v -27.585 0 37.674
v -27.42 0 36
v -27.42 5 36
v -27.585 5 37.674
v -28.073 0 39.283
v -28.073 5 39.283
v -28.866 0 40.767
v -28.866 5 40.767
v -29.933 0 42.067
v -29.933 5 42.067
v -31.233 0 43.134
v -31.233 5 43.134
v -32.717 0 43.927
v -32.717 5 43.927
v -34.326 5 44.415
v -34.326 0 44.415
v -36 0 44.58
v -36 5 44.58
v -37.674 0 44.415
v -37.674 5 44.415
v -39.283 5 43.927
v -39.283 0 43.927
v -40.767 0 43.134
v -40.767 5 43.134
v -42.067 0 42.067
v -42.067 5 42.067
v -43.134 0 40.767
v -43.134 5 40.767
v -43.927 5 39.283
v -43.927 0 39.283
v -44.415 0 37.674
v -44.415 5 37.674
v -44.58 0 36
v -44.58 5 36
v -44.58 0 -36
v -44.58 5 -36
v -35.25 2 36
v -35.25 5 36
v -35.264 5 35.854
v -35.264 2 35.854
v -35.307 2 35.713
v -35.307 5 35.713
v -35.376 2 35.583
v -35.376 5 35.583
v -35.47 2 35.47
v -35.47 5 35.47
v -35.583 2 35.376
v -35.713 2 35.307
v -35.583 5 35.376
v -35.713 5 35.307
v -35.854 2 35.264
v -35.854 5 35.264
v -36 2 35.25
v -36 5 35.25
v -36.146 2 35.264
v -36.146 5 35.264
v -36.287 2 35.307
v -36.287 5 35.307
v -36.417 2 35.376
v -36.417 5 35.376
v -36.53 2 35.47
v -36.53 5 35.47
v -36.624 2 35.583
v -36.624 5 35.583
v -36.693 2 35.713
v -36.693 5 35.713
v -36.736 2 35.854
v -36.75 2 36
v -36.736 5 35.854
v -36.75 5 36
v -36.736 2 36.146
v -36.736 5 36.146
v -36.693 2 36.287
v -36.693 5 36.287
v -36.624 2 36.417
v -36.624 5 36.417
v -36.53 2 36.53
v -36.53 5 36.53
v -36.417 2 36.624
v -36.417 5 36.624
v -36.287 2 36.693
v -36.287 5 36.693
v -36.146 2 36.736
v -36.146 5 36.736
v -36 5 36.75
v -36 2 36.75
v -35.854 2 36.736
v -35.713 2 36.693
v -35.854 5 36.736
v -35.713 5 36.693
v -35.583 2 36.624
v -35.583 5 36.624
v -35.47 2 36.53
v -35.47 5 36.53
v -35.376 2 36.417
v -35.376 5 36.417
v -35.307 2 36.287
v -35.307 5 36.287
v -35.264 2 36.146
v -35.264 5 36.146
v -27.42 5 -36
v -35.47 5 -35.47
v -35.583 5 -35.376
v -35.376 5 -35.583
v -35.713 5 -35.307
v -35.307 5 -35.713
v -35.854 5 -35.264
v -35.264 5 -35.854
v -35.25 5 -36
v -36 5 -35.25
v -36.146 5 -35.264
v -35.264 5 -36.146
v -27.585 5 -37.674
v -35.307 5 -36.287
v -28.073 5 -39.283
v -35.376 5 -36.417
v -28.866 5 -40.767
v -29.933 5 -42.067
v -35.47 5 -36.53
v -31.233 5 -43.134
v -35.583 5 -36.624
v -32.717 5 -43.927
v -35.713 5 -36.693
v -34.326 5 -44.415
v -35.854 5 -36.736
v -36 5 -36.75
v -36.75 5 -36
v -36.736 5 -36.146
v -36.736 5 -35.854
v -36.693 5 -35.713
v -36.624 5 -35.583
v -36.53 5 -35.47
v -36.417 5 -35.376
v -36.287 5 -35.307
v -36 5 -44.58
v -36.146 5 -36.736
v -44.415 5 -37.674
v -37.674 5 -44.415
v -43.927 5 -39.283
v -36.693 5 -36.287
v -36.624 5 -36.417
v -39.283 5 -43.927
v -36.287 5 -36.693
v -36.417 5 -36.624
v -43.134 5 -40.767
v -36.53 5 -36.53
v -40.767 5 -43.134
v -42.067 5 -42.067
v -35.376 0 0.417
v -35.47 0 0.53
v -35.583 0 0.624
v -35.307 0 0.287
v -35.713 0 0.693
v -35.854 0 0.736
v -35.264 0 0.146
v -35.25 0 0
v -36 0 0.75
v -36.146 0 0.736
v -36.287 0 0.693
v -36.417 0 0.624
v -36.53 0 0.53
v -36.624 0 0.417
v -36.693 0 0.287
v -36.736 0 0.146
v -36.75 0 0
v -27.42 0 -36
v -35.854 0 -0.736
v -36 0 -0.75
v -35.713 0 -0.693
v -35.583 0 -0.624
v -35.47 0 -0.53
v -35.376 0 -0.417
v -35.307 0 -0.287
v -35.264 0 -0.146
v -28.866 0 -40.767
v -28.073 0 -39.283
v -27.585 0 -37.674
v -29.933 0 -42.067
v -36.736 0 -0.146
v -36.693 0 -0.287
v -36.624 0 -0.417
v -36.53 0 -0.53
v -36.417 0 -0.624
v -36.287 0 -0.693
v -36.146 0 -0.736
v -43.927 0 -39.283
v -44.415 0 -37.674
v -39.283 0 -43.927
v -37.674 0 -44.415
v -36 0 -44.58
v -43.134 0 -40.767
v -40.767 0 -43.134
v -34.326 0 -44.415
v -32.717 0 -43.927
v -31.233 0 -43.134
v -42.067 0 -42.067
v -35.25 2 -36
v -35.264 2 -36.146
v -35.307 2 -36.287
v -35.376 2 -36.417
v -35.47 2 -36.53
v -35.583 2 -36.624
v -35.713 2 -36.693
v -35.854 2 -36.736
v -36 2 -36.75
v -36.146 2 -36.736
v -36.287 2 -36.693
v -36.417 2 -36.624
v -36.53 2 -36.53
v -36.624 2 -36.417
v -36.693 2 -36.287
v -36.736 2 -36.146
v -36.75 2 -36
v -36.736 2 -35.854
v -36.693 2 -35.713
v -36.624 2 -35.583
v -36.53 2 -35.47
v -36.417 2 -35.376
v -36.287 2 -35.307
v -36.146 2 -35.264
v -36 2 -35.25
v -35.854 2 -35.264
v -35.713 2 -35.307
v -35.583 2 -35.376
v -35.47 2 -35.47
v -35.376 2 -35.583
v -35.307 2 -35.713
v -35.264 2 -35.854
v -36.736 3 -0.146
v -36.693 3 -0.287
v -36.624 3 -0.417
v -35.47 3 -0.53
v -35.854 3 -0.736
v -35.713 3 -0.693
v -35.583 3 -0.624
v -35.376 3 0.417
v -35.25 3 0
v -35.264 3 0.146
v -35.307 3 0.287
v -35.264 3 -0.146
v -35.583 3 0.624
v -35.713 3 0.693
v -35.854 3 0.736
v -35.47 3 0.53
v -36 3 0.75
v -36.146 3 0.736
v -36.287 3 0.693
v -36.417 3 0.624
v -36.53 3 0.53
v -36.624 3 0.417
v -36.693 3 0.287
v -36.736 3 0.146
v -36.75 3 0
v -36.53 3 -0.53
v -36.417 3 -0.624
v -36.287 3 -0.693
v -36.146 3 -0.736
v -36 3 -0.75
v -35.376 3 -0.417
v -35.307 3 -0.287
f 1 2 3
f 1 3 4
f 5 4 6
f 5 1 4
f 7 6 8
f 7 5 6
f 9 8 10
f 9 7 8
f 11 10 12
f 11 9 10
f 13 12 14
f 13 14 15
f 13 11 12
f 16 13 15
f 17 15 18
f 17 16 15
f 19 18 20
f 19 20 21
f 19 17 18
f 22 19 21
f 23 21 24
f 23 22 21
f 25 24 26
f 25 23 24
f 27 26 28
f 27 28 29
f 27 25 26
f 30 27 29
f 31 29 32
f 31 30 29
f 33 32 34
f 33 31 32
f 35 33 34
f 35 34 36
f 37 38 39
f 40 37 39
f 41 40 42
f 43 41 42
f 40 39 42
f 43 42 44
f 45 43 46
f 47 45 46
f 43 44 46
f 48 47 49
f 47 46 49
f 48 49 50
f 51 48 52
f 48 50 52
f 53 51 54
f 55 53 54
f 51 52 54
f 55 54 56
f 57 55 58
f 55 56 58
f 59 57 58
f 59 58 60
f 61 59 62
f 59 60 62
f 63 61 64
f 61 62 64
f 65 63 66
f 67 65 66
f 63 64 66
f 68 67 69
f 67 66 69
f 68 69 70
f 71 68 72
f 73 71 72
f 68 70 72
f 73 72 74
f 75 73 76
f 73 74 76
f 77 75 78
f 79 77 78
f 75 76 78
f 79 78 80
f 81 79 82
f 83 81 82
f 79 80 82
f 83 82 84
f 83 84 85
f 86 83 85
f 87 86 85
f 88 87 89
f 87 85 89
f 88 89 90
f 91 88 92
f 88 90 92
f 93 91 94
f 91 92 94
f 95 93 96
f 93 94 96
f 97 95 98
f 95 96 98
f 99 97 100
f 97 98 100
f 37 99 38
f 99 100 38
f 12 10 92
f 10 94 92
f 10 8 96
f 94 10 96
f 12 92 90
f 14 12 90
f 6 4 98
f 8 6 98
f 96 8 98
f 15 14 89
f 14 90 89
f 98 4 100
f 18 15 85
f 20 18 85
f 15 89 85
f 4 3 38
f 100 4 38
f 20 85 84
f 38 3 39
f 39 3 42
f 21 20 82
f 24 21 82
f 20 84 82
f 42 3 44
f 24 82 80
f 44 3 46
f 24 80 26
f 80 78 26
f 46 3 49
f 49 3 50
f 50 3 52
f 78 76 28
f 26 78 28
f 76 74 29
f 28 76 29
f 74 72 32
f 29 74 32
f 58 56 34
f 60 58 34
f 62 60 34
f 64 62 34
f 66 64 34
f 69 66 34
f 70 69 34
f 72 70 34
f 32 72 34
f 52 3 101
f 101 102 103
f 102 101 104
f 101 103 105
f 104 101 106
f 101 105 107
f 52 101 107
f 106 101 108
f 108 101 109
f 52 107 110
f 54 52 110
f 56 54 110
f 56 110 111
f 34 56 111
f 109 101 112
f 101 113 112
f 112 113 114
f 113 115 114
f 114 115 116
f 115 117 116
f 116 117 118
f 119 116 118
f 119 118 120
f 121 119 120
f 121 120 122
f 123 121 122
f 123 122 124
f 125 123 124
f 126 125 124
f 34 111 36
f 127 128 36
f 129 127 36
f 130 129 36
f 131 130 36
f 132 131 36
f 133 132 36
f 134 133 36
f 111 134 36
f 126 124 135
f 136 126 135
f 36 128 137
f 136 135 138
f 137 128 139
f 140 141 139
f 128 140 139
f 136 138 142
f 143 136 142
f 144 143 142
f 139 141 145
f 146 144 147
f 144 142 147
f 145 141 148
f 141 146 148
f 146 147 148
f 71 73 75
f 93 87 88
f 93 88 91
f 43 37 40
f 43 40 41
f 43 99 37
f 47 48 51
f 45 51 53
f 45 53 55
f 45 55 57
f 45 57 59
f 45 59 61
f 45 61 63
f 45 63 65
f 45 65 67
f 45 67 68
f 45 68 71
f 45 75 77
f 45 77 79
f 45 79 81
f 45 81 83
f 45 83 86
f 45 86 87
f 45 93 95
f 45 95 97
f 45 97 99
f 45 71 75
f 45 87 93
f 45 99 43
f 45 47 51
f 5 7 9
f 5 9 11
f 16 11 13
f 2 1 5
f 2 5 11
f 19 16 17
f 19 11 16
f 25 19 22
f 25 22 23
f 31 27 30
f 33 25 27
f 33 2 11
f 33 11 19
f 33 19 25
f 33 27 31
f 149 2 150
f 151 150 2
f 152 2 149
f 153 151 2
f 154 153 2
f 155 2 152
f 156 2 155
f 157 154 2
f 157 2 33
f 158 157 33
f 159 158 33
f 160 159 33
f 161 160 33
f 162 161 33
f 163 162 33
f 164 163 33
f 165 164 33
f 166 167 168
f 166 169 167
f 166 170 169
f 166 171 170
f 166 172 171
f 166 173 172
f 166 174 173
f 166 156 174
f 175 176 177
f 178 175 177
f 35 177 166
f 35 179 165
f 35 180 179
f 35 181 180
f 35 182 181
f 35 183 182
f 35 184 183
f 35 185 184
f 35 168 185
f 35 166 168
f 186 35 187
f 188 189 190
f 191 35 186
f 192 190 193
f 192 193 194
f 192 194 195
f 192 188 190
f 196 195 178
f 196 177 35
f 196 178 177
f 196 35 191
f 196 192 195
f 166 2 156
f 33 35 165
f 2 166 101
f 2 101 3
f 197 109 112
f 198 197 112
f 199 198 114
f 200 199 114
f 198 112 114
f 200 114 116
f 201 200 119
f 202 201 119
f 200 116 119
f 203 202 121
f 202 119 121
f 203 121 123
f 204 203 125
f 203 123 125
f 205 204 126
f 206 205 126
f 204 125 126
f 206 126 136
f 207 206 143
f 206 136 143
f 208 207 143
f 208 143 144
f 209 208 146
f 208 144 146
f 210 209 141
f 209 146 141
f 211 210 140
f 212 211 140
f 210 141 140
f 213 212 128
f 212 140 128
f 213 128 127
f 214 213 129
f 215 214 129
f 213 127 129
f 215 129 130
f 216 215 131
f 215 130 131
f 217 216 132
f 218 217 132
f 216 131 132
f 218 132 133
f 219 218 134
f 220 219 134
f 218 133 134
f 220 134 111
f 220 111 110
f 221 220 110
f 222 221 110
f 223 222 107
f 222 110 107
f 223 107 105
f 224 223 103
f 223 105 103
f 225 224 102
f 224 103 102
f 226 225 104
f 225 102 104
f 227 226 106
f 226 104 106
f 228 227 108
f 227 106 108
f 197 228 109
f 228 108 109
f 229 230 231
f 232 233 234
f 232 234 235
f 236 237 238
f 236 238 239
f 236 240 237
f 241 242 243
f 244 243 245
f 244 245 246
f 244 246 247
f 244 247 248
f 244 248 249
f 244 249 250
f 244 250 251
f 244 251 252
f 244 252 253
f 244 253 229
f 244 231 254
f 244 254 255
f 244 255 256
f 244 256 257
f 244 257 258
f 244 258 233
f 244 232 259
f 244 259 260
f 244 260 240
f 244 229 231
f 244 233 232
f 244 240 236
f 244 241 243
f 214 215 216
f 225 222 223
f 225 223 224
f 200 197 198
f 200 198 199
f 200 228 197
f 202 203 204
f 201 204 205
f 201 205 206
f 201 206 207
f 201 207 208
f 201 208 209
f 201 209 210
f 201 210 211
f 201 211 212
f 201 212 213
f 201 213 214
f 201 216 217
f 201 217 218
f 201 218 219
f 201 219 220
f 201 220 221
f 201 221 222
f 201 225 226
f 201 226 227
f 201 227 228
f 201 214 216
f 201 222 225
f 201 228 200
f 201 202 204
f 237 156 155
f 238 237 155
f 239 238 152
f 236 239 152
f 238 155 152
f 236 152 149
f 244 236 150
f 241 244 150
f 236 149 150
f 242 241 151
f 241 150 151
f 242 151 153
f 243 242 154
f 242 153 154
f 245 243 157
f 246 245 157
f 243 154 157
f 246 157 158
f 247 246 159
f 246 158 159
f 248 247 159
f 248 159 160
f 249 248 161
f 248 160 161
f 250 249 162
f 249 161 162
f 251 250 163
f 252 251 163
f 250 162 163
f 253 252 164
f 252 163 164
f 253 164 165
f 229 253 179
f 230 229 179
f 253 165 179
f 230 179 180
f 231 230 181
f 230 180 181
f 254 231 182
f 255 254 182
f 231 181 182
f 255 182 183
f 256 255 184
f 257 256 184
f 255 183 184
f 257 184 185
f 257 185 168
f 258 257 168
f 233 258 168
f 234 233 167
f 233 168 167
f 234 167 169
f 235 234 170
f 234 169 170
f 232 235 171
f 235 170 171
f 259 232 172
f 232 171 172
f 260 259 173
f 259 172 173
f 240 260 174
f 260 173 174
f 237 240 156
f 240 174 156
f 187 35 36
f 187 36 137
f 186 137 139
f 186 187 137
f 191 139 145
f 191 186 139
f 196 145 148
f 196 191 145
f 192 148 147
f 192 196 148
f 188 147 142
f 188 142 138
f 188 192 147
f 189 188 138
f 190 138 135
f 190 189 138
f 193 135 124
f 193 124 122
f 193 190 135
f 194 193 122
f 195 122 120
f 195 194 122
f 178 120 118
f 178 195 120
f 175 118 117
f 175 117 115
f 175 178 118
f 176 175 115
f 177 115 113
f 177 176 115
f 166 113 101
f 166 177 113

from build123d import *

# Parameters (mm, degrees)
BOSS_EXTRUDE1_DEPTH = 5
SKETCH3_R           = 0.75
CUT_EXTRUDE1_DEPTH  = 3
SKETCH4_R           = 0.75
CUT_EXTRUDE2_DEPTH  = 3


with BuildPart() as part:
    # Sketch2 → Boss-Extrude1 (new body)
    with BuildSketch(Plane(origin=(0, 0, 0), x_dir=(1, 0, 0), z_dir=(0, 1, 0))):
        with BuildLine():
            Line((-27.42, 36), (-27.42, 8.582019714))
            Line((-27.42, 8.582019714), (-27.42, -8.582019714))
            Line((-27.42, -8.582019714), (-27.42, -36))
            ThreePointArc((-27.42, -36), (-36, -44.58), (-44.58, -36))
            Line((-44.58, -36), (-44.58, -8.582019714))
            Line((-44.58, -8.582019714), (-44.58, 8.582019714))
            Line((-44.58, 8.582019714), (-44.58, 36))
            ThreePointArc((-44.58, 36), (-36, 44.58), (-27.42, 36))
        make_face()
    extrude(amount=BOSS_EXTRUDE1_DEPTH)

    # Sketch3 → Cut-Extrude1 (cut)
    with BuildSketch(Plane.XZ):
        with Locations((-36, 0)):
            Circle(SKETCH3_R)
    extrude(amount=-CUT_EXTRUDE1_DEPTH, mode=Mode.SUBTRACT)

    # Sketch4 → Cut-Extrude2 (cut)
    with BuildSketch(Plane(origin=(0, 5, 0), x_dir=(1, 0, 0), z_dir=(0, 1, 0))):
        with Locations((-36, 36)):
            Circle(SKETCH4_R)
        with Locations((-36, -36)):
            Circle(SKETCH4_R)
    extrude(amount=-CUT_EXTRUDE2_DEPTH, mode=Mode.SUBTRACT)


solid = part.part
